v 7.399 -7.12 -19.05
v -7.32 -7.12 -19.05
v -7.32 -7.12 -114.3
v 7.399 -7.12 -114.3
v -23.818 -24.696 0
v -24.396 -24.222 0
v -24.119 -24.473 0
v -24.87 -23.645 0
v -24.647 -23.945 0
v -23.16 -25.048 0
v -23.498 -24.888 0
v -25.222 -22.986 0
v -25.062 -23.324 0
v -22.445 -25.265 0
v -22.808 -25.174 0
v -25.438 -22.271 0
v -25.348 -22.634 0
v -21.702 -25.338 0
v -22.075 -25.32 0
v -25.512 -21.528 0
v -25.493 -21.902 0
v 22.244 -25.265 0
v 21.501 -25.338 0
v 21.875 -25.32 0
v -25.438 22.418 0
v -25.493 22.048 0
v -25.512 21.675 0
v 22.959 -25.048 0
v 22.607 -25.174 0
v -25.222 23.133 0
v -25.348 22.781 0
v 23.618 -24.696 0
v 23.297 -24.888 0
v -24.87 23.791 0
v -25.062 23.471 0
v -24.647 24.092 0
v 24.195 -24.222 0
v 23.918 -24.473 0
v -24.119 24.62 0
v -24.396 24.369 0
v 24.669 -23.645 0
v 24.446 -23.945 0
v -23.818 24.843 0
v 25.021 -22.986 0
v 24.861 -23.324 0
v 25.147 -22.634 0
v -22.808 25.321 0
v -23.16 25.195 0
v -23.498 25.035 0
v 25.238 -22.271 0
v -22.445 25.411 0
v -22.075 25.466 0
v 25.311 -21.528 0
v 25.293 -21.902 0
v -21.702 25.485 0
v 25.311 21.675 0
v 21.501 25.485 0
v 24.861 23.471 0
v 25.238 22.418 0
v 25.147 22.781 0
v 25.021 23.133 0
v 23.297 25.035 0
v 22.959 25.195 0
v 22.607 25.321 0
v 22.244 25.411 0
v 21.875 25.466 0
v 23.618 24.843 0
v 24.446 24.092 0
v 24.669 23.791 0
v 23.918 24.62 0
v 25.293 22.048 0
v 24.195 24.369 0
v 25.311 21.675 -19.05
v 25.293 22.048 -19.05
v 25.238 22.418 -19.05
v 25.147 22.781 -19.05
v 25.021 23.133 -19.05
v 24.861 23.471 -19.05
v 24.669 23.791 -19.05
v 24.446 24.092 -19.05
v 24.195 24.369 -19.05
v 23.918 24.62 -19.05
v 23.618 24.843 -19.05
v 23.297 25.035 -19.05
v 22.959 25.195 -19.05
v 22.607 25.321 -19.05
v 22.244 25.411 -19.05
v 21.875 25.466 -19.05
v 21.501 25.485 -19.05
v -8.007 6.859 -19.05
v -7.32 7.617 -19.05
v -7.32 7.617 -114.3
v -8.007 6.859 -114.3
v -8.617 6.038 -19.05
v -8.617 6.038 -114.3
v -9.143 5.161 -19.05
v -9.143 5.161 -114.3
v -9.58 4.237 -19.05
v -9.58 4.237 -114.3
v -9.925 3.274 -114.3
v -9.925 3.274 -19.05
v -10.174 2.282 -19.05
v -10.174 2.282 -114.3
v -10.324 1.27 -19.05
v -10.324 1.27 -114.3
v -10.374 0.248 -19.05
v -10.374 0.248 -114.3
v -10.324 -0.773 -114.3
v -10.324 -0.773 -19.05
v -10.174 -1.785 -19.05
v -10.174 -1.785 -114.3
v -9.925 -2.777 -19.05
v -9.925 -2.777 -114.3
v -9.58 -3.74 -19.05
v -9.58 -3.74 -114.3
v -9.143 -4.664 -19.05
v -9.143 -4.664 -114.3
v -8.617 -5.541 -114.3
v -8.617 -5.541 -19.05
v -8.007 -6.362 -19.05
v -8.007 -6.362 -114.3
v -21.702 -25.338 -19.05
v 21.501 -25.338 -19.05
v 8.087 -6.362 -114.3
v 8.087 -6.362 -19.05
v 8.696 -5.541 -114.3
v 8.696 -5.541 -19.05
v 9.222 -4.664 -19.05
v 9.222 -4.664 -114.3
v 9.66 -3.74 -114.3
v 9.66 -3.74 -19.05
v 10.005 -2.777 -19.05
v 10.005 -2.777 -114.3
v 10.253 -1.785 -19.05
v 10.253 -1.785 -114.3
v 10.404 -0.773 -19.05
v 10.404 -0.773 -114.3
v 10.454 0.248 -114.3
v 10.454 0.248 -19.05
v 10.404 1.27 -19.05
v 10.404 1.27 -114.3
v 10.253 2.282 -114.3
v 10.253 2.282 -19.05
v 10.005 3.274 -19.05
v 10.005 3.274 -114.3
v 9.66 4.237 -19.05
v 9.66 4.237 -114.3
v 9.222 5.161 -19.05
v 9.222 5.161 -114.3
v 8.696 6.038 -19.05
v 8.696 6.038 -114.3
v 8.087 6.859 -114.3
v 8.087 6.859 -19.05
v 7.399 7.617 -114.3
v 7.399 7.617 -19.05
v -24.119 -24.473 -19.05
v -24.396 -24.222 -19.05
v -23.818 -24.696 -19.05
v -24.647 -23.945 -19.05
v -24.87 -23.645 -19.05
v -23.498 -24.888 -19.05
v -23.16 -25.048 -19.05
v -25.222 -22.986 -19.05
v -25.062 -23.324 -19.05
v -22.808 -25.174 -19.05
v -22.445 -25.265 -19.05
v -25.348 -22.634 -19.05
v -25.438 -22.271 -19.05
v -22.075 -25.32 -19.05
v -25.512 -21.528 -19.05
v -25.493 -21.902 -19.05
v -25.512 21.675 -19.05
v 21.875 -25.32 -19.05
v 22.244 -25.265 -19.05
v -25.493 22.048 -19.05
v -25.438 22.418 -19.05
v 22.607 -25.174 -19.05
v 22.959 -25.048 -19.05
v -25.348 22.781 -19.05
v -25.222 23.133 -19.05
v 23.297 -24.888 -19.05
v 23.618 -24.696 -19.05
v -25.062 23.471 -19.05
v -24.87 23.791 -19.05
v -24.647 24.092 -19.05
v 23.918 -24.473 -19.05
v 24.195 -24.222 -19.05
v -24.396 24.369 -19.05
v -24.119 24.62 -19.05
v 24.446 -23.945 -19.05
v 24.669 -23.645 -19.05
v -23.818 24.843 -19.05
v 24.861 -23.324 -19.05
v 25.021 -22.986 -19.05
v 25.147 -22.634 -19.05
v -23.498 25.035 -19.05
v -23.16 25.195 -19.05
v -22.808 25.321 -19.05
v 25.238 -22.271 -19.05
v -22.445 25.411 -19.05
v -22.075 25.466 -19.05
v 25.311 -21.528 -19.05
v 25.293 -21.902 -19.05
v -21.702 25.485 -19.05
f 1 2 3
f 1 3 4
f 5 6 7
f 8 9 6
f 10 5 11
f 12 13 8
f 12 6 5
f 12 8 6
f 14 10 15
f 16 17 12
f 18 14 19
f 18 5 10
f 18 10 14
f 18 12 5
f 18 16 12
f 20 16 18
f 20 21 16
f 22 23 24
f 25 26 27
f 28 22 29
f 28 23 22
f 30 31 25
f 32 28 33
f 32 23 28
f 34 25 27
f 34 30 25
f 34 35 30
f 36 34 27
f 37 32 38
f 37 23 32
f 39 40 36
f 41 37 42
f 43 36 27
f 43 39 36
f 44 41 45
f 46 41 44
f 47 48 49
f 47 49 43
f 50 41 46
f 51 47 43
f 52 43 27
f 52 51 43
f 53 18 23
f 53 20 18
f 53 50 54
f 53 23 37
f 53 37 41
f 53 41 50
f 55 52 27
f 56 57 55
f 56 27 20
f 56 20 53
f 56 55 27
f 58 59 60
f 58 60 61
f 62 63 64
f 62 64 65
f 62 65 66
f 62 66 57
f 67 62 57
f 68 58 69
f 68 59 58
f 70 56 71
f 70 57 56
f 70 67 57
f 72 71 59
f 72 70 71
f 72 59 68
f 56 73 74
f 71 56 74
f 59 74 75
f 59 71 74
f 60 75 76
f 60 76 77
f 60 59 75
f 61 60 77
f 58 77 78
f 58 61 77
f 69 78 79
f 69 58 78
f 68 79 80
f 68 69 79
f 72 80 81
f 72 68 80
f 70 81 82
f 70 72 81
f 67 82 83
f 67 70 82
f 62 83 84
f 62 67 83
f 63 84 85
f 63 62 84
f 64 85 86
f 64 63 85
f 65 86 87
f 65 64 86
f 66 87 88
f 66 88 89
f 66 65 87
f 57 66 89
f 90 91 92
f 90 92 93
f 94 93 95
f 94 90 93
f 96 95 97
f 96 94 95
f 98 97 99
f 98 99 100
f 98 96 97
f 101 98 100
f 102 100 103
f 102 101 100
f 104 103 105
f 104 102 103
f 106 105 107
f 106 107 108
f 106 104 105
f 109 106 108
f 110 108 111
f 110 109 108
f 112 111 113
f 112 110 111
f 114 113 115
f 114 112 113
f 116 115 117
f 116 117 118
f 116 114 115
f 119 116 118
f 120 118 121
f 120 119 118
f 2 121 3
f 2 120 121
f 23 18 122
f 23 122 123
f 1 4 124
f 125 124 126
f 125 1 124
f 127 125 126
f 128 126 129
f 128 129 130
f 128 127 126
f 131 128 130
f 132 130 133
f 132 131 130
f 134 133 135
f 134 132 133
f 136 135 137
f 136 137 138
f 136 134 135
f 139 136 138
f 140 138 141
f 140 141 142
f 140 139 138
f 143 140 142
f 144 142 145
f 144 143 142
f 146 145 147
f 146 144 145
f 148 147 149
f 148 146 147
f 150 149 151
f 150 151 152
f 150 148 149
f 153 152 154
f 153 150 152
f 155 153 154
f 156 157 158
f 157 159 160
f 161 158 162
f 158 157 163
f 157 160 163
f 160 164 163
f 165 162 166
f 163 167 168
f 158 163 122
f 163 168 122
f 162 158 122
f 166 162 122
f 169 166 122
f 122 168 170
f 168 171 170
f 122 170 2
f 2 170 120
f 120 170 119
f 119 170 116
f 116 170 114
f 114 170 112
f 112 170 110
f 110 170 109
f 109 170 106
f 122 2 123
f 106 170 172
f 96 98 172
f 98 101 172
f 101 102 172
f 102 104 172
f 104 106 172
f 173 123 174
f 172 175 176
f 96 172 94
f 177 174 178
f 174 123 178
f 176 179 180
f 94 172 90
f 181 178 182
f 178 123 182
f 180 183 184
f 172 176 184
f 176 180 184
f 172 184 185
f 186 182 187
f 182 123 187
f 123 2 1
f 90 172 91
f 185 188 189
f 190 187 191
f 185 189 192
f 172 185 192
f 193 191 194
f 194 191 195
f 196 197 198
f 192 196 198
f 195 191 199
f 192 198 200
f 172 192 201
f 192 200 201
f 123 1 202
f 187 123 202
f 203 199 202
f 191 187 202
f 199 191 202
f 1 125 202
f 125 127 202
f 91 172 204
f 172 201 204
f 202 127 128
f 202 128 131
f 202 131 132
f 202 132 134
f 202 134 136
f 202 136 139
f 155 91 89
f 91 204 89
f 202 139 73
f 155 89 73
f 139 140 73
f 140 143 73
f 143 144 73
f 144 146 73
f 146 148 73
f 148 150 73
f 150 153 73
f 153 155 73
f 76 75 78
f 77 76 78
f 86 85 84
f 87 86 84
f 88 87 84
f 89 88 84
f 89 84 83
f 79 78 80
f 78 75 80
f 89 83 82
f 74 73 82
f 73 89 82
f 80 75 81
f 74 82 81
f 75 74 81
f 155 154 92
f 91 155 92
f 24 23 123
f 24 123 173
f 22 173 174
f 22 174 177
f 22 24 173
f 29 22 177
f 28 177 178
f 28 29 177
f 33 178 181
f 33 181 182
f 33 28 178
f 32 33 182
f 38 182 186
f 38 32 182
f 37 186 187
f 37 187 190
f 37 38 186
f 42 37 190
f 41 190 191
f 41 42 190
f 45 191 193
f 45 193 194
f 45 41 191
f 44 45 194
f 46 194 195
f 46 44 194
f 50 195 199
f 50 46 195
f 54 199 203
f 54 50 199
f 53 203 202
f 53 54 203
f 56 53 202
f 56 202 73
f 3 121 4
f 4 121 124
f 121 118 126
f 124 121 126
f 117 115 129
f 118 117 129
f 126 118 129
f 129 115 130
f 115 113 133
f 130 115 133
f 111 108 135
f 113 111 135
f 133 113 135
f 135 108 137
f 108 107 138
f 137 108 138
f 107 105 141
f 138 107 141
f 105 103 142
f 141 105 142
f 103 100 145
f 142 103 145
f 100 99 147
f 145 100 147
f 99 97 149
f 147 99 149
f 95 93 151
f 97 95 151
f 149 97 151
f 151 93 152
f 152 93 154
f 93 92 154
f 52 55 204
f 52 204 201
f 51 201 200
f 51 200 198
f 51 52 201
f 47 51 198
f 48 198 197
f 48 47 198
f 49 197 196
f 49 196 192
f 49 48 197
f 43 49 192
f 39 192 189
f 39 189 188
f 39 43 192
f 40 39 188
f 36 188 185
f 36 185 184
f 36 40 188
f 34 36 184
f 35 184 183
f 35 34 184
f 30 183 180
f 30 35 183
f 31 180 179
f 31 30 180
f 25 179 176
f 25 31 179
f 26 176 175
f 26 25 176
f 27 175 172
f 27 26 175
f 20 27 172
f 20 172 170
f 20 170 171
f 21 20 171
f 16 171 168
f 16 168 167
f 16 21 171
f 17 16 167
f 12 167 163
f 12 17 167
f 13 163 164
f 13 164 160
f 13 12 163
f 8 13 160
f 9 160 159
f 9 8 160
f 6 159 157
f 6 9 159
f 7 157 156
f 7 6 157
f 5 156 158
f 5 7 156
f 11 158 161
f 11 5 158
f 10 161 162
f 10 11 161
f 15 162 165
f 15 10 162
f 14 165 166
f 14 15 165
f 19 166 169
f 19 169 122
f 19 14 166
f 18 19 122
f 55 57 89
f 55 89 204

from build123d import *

# Parameters (mm, degrees)
BOSS_EXTRUDE1_DEPTH = 114.3
BOSS_EXTRUDE2_DEPTH = 19.05


with BuildPart() as part:
    # Sketch2 → Boss-Extrude1 (new body)
    with BuildSketch(Plane.XY):
        with BuildLine():
            Line((-7.31960848, -7.119729616), (7.399296286, -7.119729616))
            ThreePointArc((7.399296286, -7.119729616), (10.453843903, 0.248435463), (7.399296286, 7.616600541))
            Line((7.399296286, 7.616600541), (-7.31960848, 7.616600541))
            ThreePointArc((-7.31960848, 7.616600541), (-10.374156097, 0.248435463), (-7.31960848, -7.119729616))
        make_face()
    extrude(amount=-BOSS_EXTRUDE1_DEPTH)

    # Sketch1 → Boss-Extrude2 (add)
    with BuildSketch(Plane.XY):
        with BuildLine():
            Line((-21.701618149, -25.338055696), (21.501073099, -25.338055696))
            ThreePointArc((21.501073099, -25.338055696), (24.195149936, -24.222132532), (25.311073099, -21.528055696))
            Line((25.311073099, -21.528055696), (25.311073099, 21.674635553))
            ThreePointArc((25.311073099, 21.674635553), (24.195149936, 24.368712389), (21.501073099, 25.484635553))
            Line((21.501073099, 25.484635553), (-21.701618149, 25.484635553))
            ThreePointArc((-21.701618149, 25.484635553), (-24.395694985, 24.368712389), (-25.511618149, 21.674635553))
            Line((-25.511618149, 21.674635553), (-25.511618149, -21.528055696))
            ThreePointArc((-25.511618149, -21.528055696), (-24.395694985, -24.222132532), (-21.701618149, -25.338055696))
        make_face()
    extrude(amount=-BOSS_EXTRUDE2_DEPTH)


solid = part.part
